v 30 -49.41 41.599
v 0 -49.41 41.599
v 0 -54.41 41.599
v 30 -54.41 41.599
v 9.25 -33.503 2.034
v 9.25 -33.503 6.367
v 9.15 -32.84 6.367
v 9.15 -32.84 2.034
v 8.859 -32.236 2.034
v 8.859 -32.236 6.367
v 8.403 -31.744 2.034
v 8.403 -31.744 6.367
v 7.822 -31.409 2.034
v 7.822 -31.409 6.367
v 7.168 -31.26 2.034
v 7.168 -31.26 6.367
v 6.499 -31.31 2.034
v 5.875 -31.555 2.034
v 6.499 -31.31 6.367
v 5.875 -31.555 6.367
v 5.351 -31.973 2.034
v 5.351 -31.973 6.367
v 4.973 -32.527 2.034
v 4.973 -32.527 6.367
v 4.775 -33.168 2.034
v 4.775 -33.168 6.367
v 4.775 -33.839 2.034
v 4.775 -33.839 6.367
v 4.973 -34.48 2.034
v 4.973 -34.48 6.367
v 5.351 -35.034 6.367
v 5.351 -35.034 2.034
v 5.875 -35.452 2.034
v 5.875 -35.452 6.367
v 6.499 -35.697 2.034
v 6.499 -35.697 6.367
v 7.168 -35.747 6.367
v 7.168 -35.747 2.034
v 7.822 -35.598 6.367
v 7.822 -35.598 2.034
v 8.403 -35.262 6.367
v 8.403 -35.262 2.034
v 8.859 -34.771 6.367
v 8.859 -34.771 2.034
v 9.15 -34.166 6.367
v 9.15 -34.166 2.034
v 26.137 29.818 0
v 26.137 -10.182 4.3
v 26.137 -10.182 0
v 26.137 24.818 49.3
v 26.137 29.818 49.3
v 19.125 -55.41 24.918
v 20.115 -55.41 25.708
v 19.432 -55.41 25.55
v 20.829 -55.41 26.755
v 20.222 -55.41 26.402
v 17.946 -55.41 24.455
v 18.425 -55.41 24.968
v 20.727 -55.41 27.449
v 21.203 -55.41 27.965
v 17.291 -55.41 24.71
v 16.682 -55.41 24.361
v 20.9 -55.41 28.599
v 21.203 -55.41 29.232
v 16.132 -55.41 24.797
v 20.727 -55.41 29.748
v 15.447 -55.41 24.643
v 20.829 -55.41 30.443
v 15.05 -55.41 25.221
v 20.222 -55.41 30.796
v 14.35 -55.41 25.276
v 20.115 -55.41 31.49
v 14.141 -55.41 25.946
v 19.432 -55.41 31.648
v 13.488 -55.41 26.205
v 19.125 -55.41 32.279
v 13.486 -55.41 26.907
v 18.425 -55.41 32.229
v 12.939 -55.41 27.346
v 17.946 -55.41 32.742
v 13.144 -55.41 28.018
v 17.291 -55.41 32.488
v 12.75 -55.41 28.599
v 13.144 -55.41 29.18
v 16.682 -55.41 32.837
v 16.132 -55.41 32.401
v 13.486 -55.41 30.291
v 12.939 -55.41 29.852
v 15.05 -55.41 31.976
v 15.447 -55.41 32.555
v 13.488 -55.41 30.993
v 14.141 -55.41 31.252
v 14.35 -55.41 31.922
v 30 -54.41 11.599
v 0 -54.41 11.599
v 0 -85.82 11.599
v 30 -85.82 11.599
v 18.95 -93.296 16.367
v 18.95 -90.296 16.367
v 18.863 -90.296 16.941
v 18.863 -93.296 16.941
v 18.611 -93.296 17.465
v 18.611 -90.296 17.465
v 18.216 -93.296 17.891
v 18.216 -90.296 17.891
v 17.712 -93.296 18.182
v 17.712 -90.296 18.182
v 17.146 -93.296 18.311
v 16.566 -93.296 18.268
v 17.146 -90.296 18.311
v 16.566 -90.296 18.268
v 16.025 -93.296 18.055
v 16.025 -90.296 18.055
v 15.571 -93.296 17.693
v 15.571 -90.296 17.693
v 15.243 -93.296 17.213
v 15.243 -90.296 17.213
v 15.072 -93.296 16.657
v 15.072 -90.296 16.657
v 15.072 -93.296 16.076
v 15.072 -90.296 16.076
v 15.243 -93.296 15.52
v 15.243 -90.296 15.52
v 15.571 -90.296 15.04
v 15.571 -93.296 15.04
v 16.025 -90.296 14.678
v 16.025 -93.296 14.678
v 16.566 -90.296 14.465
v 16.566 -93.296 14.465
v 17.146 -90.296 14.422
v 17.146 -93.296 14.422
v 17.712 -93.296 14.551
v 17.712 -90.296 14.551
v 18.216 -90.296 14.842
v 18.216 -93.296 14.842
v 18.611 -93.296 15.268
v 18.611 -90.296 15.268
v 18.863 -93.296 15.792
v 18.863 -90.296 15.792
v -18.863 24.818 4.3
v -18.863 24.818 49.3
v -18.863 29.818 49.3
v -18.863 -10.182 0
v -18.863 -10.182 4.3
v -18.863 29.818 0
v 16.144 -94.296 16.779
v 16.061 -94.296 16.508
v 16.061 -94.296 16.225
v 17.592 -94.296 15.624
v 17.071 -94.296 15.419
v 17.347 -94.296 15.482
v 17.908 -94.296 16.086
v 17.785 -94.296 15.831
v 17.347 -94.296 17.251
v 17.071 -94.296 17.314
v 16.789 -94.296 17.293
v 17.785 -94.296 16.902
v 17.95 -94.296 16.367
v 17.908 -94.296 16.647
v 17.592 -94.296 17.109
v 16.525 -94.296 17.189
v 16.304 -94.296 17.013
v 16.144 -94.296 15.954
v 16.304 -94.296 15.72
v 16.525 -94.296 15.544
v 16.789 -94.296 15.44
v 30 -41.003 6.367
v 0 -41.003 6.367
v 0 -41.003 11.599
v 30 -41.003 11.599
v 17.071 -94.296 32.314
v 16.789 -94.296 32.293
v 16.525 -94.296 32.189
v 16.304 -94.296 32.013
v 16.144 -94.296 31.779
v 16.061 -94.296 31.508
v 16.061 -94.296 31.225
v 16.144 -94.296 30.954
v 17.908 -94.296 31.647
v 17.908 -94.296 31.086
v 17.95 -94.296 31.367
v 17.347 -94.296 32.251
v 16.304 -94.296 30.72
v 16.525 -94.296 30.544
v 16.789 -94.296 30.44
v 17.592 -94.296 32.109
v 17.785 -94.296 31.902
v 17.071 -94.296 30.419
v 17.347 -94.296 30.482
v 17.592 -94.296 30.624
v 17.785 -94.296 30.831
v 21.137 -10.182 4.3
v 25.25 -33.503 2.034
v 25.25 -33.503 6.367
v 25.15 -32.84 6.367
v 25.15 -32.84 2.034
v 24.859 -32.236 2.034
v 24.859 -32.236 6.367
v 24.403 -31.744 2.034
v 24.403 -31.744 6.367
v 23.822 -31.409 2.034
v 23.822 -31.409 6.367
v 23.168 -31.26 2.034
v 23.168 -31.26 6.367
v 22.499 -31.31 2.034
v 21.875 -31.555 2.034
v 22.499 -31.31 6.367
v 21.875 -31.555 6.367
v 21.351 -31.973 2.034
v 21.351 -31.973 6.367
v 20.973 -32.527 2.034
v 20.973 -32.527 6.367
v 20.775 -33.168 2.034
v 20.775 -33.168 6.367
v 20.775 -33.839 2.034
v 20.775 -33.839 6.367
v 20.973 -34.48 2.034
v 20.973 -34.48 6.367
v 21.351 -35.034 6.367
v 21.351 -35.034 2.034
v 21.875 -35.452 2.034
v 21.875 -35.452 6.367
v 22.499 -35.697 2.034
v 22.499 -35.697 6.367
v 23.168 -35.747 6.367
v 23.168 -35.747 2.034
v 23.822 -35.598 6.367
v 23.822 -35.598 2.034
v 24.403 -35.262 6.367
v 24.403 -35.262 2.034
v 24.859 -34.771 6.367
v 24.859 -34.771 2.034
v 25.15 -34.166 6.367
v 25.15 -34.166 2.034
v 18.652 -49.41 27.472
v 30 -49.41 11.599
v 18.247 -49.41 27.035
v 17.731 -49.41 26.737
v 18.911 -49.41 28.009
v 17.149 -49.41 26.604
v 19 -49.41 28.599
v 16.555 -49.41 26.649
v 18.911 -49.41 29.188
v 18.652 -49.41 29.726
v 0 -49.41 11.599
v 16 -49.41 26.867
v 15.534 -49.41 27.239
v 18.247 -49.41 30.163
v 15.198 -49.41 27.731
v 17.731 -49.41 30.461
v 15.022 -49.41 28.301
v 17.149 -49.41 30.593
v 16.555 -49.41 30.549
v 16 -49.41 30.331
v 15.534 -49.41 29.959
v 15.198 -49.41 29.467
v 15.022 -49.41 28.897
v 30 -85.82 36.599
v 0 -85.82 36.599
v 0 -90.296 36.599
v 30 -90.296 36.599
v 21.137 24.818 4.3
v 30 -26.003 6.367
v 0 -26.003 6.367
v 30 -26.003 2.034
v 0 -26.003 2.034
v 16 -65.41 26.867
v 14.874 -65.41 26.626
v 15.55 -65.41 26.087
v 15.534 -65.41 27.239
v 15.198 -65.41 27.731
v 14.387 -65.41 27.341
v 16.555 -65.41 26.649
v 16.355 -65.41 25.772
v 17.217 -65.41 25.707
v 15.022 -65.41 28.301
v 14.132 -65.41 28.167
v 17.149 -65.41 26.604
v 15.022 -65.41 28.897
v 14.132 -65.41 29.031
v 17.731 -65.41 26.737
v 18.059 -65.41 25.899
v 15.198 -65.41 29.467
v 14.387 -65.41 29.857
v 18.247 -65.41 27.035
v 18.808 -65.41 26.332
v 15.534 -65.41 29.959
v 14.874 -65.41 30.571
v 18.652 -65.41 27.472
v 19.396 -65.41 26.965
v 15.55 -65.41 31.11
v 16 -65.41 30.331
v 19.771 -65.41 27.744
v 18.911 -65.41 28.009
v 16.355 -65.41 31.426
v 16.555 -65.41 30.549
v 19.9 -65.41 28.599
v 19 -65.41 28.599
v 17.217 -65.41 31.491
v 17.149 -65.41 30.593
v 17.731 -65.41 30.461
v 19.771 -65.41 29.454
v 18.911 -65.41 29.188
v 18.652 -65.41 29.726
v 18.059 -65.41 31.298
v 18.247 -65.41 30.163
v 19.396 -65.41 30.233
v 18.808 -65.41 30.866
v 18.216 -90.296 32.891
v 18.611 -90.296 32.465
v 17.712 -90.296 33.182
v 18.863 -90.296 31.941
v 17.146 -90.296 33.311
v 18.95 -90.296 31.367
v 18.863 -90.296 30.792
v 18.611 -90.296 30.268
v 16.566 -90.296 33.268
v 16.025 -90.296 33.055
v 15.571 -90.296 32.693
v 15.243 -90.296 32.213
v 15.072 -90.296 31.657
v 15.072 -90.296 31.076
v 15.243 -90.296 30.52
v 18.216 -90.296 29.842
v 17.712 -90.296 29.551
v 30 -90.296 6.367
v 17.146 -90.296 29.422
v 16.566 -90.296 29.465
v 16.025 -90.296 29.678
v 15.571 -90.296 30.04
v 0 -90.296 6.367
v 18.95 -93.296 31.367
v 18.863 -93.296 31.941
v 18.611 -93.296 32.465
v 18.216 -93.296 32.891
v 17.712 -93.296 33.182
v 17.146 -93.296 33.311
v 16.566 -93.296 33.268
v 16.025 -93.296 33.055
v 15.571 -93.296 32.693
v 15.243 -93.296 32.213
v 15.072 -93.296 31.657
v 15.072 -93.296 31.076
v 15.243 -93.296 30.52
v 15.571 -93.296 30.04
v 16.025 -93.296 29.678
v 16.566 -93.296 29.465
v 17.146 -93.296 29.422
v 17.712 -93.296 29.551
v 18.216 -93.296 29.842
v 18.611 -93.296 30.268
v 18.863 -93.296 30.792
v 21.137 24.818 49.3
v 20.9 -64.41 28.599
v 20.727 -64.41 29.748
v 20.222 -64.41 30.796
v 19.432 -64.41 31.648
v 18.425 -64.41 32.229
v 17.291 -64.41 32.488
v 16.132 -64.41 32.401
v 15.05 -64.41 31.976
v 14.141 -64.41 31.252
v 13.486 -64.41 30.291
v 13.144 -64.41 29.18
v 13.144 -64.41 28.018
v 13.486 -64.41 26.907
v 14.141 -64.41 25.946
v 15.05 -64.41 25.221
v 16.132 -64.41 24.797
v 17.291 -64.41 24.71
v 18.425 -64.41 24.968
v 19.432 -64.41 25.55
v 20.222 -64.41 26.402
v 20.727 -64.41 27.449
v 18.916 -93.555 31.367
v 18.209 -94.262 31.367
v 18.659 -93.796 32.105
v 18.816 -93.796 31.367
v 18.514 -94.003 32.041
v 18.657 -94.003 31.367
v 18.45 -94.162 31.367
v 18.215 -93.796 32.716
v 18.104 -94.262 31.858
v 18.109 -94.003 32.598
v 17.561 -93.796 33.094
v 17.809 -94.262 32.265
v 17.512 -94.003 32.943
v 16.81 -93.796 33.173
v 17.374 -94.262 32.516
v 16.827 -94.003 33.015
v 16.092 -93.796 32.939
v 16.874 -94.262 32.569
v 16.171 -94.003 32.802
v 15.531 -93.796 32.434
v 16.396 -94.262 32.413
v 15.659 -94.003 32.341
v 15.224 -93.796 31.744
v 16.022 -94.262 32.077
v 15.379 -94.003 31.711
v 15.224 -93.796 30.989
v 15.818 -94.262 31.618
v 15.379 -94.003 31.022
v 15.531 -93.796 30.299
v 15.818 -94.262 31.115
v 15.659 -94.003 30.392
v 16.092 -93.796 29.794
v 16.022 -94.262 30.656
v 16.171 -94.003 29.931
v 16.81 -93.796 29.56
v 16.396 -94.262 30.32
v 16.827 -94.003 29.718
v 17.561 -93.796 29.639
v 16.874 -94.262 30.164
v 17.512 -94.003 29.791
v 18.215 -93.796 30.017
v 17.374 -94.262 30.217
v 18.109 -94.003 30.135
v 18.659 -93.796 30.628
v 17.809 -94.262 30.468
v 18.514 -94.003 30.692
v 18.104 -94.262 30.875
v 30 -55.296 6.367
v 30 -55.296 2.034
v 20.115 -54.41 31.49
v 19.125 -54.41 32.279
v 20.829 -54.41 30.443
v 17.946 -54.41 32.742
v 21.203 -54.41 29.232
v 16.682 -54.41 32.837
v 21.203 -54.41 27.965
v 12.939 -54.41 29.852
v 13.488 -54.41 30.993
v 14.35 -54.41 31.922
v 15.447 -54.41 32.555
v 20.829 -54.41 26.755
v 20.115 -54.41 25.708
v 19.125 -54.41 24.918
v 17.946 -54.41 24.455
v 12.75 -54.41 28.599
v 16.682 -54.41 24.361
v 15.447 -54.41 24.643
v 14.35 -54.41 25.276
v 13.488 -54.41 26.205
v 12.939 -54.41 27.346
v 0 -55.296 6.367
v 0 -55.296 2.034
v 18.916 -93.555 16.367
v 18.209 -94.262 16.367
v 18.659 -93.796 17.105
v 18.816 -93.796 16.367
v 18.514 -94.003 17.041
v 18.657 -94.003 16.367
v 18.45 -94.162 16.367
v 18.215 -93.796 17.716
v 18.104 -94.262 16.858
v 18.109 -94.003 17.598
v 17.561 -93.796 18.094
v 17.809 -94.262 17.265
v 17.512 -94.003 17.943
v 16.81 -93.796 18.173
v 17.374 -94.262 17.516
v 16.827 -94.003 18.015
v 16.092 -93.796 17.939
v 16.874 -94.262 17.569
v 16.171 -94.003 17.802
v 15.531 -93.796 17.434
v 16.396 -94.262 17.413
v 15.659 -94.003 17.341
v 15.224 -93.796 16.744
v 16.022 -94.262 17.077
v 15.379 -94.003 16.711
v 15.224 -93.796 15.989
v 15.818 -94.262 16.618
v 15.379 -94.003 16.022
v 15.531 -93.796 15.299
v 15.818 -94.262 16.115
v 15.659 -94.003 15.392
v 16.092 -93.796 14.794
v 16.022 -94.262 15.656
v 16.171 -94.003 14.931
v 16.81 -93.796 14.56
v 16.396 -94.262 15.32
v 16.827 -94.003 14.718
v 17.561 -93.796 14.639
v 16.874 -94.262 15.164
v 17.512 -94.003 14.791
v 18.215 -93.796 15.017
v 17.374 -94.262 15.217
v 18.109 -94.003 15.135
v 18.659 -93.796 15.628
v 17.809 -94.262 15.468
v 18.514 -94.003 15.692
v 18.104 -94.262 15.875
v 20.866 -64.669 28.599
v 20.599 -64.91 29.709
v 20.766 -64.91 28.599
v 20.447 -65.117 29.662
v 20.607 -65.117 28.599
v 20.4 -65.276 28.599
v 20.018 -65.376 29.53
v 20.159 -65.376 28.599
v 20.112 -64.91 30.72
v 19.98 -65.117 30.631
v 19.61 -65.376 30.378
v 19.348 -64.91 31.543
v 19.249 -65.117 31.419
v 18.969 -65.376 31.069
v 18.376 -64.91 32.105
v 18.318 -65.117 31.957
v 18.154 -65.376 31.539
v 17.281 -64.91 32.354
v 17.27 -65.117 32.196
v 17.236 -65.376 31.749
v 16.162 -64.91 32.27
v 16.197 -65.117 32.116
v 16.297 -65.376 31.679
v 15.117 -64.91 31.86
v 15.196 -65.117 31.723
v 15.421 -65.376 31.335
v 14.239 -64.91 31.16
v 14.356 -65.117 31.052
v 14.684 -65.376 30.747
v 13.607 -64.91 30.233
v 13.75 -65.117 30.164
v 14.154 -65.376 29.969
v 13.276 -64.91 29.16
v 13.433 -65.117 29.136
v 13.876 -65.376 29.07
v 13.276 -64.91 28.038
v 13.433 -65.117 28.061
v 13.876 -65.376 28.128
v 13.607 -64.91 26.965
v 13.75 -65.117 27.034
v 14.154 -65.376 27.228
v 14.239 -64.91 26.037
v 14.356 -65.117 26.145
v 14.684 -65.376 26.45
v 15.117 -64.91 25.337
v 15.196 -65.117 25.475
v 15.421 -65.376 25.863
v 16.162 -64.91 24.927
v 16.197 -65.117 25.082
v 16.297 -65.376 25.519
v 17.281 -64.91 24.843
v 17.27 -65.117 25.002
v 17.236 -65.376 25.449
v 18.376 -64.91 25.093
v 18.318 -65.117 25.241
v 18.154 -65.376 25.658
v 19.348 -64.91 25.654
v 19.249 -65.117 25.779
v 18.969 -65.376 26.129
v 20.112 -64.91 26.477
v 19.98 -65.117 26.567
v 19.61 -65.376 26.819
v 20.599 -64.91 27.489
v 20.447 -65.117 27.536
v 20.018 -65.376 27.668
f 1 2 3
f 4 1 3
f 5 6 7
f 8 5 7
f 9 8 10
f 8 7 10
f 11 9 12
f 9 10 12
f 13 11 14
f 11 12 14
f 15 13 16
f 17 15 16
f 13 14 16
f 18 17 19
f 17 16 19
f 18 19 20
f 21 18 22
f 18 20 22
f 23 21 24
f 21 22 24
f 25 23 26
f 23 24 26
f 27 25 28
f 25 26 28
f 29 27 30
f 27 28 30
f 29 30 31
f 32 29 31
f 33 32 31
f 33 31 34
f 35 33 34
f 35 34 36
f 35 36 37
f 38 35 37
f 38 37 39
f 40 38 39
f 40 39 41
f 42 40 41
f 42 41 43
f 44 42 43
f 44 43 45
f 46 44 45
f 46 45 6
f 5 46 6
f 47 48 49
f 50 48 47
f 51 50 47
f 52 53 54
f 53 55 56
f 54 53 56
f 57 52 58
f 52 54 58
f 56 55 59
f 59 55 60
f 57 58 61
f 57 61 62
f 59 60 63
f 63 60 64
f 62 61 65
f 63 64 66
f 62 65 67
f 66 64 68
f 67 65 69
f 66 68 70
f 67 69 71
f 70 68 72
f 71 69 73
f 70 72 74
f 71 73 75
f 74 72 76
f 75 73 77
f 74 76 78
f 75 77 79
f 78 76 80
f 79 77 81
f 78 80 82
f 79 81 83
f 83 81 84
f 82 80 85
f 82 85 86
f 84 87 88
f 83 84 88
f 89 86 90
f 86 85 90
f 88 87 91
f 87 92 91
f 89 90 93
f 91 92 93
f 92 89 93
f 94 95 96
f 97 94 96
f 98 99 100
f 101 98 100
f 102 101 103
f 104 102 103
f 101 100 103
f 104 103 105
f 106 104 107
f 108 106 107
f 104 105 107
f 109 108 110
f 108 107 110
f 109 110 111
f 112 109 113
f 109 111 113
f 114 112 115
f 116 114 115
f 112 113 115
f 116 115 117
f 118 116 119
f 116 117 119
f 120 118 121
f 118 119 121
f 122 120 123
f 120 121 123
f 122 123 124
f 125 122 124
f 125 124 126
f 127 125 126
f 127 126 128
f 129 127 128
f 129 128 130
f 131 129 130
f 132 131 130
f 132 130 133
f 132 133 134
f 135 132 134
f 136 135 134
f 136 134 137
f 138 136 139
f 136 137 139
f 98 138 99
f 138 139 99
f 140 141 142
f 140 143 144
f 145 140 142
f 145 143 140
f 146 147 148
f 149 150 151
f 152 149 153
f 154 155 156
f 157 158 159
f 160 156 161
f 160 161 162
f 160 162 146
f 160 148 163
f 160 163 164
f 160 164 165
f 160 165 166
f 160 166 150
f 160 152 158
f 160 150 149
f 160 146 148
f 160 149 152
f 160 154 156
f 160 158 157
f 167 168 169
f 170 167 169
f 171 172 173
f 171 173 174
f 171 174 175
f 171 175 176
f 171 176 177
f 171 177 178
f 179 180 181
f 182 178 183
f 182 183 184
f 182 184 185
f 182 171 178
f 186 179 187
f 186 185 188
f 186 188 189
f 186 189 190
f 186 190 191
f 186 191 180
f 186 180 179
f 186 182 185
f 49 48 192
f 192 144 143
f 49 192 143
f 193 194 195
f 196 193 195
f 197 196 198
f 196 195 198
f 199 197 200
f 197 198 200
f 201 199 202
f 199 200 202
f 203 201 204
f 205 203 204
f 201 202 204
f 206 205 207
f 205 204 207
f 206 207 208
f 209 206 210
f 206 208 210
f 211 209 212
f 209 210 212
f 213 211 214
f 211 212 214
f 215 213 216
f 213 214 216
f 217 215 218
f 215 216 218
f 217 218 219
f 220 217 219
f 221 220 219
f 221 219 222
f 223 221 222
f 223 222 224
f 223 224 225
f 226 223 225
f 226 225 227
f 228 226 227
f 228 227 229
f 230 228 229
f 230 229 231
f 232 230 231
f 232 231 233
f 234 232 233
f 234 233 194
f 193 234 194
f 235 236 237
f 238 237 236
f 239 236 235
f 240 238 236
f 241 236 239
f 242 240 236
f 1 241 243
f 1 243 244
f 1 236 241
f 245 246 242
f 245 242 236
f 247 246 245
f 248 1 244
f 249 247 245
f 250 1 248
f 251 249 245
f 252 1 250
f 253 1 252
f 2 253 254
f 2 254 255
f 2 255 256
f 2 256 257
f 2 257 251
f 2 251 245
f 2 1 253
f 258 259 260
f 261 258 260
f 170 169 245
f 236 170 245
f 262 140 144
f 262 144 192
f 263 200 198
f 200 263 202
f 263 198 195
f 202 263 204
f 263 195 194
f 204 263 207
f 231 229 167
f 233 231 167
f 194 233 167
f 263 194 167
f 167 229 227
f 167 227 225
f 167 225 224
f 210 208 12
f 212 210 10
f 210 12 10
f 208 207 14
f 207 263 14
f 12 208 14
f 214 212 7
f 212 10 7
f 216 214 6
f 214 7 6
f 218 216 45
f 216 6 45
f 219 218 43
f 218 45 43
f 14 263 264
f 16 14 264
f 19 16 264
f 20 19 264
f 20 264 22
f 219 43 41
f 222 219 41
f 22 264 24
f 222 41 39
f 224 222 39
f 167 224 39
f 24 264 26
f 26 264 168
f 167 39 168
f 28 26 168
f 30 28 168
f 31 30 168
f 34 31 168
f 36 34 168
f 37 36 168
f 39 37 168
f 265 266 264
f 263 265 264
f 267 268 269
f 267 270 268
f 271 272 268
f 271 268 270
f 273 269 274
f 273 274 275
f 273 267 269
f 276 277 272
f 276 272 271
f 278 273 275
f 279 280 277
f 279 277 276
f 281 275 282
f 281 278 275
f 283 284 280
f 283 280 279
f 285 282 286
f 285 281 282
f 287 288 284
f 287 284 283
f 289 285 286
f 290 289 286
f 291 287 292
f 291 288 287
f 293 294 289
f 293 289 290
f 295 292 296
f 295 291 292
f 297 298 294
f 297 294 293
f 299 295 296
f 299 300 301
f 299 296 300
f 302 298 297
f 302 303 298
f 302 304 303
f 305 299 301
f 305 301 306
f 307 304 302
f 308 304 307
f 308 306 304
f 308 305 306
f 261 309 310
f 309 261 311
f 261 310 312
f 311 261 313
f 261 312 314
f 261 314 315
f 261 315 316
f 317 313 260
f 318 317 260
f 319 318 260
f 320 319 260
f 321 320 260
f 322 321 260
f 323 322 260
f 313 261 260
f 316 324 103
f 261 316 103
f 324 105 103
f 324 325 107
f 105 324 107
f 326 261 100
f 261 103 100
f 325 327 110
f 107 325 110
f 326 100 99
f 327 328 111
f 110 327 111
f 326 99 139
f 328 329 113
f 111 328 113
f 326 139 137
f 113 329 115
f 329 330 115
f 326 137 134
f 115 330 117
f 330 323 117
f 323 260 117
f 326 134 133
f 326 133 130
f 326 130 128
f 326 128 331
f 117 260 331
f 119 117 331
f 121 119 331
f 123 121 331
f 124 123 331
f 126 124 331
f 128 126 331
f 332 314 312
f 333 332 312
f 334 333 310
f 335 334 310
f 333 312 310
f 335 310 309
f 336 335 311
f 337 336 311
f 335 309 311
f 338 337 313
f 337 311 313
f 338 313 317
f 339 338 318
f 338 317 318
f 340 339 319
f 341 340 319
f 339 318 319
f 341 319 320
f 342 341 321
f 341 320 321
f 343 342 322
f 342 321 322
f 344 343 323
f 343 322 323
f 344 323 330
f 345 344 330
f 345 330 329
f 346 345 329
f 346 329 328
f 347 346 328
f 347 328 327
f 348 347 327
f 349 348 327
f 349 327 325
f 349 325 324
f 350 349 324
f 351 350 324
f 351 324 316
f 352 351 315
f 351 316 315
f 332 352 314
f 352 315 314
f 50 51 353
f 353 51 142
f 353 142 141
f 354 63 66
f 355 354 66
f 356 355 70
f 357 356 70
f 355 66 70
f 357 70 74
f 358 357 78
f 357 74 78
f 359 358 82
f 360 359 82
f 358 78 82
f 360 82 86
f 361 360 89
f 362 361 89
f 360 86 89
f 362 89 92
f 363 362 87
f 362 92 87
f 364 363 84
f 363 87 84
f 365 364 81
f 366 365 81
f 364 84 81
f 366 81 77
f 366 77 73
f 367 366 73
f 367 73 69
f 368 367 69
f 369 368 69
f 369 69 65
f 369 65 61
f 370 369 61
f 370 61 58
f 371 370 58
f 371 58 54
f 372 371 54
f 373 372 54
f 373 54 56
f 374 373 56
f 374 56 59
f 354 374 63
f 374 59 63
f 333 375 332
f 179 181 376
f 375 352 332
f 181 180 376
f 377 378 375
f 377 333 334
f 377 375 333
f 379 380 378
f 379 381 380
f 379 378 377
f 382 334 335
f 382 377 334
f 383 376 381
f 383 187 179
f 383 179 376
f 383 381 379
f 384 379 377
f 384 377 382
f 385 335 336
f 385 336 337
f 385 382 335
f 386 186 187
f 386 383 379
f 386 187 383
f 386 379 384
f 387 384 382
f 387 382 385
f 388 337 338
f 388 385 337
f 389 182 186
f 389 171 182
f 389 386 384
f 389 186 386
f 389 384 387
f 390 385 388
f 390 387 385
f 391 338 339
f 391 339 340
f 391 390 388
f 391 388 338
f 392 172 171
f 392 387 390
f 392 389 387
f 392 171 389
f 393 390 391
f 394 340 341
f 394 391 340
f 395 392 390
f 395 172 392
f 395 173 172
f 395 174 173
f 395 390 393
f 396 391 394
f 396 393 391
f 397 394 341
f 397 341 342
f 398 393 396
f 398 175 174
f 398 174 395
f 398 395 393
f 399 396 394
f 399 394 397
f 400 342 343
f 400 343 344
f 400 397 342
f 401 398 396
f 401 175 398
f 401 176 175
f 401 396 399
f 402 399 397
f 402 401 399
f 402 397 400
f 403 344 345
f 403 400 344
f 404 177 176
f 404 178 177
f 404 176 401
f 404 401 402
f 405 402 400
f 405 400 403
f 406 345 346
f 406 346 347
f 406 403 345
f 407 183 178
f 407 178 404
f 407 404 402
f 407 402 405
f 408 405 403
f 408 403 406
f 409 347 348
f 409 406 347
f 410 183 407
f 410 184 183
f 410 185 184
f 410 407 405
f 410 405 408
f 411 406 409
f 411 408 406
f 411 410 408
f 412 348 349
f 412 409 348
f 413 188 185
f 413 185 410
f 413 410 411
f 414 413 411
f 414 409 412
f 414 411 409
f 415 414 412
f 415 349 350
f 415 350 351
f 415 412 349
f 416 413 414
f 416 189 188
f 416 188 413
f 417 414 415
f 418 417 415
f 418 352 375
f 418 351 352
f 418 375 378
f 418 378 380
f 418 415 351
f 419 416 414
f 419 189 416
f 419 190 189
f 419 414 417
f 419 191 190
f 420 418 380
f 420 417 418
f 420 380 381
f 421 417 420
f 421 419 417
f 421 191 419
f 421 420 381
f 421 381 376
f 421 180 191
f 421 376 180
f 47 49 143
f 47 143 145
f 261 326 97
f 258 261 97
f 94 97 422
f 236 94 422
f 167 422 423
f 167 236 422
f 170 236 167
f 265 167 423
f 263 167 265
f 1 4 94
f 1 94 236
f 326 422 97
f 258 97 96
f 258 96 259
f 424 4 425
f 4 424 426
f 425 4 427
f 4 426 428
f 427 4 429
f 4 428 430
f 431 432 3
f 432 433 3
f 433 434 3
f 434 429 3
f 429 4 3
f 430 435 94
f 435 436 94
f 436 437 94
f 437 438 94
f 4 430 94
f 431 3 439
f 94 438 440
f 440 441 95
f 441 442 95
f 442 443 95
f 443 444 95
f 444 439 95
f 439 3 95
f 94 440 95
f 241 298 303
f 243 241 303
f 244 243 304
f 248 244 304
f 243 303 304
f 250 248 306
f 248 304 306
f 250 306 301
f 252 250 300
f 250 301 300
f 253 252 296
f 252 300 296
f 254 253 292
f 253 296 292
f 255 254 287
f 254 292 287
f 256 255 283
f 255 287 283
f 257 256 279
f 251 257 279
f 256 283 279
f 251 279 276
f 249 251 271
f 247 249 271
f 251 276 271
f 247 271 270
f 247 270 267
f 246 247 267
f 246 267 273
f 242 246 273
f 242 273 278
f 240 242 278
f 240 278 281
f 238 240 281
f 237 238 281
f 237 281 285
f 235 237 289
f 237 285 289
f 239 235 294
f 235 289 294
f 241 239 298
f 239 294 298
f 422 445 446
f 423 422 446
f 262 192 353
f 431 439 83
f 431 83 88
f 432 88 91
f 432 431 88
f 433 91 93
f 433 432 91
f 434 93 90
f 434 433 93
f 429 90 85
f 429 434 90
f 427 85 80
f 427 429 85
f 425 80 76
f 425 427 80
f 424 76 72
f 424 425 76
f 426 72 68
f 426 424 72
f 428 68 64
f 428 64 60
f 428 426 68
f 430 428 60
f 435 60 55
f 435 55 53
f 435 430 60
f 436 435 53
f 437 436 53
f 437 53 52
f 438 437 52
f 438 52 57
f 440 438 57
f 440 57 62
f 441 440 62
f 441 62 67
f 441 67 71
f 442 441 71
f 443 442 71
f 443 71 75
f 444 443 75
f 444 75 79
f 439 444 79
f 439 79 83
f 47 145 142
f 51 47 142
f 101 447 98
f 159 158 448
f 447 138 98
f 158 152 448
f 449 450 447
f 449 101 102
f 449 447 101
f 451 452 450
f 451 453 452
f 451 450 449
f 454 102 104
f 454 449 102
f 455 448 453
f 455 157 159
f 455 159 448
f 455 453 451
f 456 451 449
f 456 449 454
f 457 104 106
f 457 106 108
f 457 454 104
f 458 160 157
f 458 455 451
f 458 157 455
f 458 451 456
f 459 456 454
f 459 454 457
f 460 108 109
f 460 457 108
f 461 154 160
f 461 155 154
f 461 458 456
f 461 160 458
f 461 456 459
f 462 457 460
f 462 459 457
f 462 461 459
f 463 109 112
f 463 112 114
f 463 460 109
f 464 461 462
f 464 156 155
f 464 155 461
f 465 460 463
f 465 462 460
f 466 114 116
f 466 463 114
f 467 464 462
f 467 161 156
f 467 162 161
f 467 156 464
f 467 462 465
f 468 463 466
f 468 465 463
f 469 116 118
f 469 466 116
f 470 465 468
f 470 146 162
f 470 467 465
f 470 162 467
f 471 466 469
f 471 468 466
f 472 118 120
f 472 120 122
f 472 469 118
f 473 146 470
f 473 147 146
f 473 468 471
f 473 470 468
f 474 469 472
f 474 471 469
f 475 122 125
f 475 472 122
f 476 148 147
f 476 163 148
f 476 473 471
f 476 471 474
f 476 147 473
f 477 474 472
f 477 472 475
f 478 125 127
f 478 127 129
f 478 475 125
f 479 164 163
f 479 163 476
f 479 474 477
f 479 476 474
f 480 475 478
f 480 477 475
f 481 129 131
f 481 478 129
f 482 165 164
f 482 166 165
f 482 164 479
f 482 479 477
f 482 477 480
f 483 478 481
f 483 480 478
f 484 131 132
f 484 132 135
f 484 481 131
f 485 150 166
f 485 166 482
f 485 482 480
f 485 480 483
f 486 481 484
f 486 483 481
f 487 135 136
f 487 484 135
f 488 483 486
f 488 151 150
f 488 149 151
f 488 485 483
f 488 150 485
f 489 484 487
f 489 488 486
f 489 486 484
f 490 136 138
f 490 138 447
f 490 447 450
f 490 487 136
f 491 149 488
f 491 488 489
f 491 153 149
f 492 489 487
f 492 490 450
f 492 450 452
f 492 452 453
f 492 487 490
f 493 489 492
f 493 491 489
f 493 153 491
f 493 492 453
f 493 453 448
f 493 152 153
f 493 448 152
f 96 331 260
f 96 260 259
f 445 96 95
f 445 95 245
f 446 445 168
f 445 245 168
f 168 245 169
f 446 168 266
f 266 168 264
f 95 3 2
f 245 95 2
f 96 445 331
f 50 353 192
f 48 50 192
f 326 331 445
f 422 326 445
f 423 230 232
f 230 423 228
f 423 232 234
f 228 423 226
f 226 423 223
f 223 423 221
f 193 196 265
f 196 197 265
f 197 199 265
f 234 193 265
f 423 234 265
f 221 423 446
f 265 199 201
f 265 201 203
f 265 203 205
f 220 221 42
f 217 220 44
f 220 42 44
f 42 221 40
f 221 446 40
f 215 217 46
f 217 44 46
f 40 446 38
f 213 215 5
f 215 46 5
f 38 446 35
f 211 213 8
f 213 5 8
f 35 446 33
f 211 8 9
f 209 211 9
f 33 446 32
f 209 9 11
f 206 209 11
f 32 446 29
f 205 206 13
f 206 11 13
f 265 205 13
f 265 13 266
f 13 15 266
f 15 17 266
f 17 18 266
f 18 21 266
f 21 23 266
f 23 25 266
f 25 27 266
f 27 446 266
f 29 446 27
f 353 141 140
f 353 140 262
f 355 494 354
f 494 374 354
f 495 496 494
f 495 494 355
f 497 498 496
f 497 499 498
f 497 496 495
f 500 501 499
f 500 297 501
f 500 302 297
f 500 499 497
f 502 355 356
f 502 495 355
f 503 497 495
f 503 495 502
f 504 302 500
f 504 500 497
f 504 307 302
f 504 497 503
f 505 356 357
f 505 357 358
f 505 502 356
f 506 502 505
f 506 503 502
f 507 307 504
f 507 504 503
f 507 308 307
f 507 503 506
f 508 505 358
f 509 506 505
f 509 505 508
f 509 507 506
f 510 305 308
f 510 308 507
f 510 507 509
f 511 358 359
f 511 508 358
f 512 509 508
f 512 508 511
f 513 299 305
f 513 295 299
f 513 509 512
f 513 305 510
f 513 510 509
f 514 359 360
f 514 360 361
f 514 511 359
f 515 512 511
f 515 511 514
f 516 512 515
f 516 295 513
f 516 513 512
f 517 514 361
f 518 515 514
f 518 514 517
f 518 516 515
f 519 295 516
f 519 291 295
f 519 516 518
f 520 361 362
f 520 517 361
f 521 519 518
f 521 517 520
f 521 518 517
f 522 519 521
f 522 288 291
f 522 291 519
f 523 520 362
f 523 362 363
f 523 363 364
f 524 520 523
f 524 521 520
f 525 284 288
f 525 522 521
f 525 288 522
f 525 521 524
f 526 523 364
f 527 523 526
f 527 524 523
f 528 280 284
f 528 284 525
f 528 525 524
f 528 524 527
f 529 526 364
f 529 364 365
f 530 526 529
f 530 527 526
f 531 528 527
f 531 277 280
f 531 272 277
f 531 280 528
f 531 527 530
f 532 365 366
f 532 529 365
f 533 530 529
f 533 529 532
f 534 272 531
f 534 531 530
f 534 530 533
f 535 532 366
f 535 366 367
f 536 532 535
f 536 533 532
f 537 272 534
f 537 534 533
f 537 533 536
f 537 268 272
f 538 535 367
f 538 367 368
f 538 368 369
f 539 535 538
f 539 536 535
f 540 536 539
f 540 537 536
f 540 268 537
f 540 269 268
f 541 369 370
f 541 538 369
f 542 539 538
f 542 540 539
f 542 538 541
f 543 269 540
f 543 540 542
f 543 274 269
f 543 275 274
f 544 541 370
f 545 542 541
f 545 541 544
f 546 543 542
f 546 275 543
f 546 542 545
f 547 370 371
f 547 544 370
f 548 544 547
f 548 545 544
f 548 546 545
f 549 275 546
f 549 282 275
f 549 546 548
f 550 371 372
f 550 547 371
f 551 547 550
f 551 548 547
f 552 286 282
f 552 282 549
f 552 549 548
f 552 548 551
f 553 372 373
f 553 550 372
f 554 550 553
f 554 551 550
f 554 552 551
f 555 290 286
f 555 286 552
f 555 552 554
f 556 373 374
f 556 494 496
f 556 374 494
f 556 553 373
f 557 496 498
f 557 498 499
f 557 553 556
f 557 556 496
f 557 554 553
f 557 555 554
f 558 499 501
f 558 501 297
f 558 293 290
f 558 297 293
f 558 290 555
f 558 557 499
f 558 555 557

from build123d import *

# Parameters (mm, degrees)
F0_W      = 40
F0_H      = 40
F1_DEPTH  = 4.3
F2_W      = 40
F2_H      = 5
F3_DEPTH  = 45
F5_DEPTH  = 5
F7_DEPTH  = 30
F8_R      = 4.25
F9_DEPTH  = 6
F10_R     = 3.9
F11_DEPTH = 10
F12_R     = 1
F13_R     = 2.25
F14_DEPTH = 4.332997
F15_R     = 2
F16_DEPTH = 16
F17_R     = 1.95
F18_DEPTH = 4
F19_R     = 1


with BuildPart() as f1:
    # F0 (on Top) → F1 (new body)
    with BuildSketch(Plane.XY):
        with Locations((1.137482, 9.817922)):
            Rectangle(F0_W, F0_H)
    extrude(amount=F1_DEPTH)

    # F2 (on face) → F3 (join)
    with BuildSketch(Plane.XY.offset(4.3)):
        with Locations((1.137482, 27.317922)):
            Rectangle(F2_W, F2_H)
    extrude(amount=F3_DEPTH)

    # F4 (on face) → F5 (join)
    with BuildSketch(Plane.YZ.offset(21.137482)):
        Polygon((29.817922, 0), (29.817922, 49.3), (24.817922, 49.3), (-10.182078, 4.3), (-10.182078, 0), align=None)
    extrude(amount=F5_DEPTH)


with BuildPart() as f7:
    # F6 (on Right) → F7 (new body)
    with BuildSketch(Plane.YZ):
        Polygon((-55.295794, 2.033508), (-26.003286, 2.033508), (-26.003286, 6.366504), (-41.003286, 6.366504), (-41.003286, 11.598888), (-49.409722, 11.598888), (-49.409722, 41.598888), (-54.409722, 41.598888), (-54.409722, 11.598888), (-85.819803, 11.598888), (-85.819803, 36.598888), (-90.295722, 36.598888), (-90.295722, 11.598888), (-90.295722, 6.366504), (-55.295794, 6.366504), align=None)
    extrude(amount=F7_DEPTH)

    # F8 (on face) → F9 (join)
    with BuildSketch(Plane(origin=(0, -49.409722, 0), x_dir=(-1, 0, 0), z_dir=(0, 1, 0))):
        with Locations((-17, 28.598888)):
            Circle(F8_R)
    extrude(amount=-F9_DEPTH)

    # F10 (on face) → F11 (join)
    with BuildSketch(Plane.XZ.offset(55.409722)):
        with Locations((17, 28.598888)):
            Circle(F10_R)
    extrude(amount=F11_DEPTH)

    # F12
    f12_edges = [f7.edges().sort_by_distance(p)[0] for p in [
        (13.1, -65.409722, 28.598888),
    ]]
    fillet(f12_edges, radius=F12_R)

    # F13 (on face) → F14 (cut, through all)
    with BuildSketch(Plane.XY.offset(6.366504)):
        with Locations((23, -33.503286)):
            Circle(F13_R)
        with Locations((7, -33.503286)):
            Circle(F13_R)
    extrude(amount=-F14_DEPTH, mode=Mode.SUBTRACT)

    # F15 (on face) → F16 (cut, through all)
    with BuildSketch(Plane.XZ.offset(65.409722)):
        with Locations((17, 28.598888)):
            Circle(F15_R)
    extrude(amount=-F16_DEPTH, mode=Mode.SUBTRACT)

    # F17 (on face) → F18 (join)
    with BuildSketch(Plane.XZ.offset(90.295722)):
        with Locations((17, 31.366504)):
            Circle(F17_R)
        with Locations((17, 16.366504)):
            Circle(F17_R)
    extrude(amount=F18_DEPTH)

    # F19
    f19_edges = [f7.edges().sort_by_distance(p)[0] for p in [
        (15.05, -94.295722, 31.366504),
        (15.05, -94.295722, 16.366504),
    ]]
    fillet(f19_edges, radius=F19_R)


solid = Compound([f1.part, f7.part])
